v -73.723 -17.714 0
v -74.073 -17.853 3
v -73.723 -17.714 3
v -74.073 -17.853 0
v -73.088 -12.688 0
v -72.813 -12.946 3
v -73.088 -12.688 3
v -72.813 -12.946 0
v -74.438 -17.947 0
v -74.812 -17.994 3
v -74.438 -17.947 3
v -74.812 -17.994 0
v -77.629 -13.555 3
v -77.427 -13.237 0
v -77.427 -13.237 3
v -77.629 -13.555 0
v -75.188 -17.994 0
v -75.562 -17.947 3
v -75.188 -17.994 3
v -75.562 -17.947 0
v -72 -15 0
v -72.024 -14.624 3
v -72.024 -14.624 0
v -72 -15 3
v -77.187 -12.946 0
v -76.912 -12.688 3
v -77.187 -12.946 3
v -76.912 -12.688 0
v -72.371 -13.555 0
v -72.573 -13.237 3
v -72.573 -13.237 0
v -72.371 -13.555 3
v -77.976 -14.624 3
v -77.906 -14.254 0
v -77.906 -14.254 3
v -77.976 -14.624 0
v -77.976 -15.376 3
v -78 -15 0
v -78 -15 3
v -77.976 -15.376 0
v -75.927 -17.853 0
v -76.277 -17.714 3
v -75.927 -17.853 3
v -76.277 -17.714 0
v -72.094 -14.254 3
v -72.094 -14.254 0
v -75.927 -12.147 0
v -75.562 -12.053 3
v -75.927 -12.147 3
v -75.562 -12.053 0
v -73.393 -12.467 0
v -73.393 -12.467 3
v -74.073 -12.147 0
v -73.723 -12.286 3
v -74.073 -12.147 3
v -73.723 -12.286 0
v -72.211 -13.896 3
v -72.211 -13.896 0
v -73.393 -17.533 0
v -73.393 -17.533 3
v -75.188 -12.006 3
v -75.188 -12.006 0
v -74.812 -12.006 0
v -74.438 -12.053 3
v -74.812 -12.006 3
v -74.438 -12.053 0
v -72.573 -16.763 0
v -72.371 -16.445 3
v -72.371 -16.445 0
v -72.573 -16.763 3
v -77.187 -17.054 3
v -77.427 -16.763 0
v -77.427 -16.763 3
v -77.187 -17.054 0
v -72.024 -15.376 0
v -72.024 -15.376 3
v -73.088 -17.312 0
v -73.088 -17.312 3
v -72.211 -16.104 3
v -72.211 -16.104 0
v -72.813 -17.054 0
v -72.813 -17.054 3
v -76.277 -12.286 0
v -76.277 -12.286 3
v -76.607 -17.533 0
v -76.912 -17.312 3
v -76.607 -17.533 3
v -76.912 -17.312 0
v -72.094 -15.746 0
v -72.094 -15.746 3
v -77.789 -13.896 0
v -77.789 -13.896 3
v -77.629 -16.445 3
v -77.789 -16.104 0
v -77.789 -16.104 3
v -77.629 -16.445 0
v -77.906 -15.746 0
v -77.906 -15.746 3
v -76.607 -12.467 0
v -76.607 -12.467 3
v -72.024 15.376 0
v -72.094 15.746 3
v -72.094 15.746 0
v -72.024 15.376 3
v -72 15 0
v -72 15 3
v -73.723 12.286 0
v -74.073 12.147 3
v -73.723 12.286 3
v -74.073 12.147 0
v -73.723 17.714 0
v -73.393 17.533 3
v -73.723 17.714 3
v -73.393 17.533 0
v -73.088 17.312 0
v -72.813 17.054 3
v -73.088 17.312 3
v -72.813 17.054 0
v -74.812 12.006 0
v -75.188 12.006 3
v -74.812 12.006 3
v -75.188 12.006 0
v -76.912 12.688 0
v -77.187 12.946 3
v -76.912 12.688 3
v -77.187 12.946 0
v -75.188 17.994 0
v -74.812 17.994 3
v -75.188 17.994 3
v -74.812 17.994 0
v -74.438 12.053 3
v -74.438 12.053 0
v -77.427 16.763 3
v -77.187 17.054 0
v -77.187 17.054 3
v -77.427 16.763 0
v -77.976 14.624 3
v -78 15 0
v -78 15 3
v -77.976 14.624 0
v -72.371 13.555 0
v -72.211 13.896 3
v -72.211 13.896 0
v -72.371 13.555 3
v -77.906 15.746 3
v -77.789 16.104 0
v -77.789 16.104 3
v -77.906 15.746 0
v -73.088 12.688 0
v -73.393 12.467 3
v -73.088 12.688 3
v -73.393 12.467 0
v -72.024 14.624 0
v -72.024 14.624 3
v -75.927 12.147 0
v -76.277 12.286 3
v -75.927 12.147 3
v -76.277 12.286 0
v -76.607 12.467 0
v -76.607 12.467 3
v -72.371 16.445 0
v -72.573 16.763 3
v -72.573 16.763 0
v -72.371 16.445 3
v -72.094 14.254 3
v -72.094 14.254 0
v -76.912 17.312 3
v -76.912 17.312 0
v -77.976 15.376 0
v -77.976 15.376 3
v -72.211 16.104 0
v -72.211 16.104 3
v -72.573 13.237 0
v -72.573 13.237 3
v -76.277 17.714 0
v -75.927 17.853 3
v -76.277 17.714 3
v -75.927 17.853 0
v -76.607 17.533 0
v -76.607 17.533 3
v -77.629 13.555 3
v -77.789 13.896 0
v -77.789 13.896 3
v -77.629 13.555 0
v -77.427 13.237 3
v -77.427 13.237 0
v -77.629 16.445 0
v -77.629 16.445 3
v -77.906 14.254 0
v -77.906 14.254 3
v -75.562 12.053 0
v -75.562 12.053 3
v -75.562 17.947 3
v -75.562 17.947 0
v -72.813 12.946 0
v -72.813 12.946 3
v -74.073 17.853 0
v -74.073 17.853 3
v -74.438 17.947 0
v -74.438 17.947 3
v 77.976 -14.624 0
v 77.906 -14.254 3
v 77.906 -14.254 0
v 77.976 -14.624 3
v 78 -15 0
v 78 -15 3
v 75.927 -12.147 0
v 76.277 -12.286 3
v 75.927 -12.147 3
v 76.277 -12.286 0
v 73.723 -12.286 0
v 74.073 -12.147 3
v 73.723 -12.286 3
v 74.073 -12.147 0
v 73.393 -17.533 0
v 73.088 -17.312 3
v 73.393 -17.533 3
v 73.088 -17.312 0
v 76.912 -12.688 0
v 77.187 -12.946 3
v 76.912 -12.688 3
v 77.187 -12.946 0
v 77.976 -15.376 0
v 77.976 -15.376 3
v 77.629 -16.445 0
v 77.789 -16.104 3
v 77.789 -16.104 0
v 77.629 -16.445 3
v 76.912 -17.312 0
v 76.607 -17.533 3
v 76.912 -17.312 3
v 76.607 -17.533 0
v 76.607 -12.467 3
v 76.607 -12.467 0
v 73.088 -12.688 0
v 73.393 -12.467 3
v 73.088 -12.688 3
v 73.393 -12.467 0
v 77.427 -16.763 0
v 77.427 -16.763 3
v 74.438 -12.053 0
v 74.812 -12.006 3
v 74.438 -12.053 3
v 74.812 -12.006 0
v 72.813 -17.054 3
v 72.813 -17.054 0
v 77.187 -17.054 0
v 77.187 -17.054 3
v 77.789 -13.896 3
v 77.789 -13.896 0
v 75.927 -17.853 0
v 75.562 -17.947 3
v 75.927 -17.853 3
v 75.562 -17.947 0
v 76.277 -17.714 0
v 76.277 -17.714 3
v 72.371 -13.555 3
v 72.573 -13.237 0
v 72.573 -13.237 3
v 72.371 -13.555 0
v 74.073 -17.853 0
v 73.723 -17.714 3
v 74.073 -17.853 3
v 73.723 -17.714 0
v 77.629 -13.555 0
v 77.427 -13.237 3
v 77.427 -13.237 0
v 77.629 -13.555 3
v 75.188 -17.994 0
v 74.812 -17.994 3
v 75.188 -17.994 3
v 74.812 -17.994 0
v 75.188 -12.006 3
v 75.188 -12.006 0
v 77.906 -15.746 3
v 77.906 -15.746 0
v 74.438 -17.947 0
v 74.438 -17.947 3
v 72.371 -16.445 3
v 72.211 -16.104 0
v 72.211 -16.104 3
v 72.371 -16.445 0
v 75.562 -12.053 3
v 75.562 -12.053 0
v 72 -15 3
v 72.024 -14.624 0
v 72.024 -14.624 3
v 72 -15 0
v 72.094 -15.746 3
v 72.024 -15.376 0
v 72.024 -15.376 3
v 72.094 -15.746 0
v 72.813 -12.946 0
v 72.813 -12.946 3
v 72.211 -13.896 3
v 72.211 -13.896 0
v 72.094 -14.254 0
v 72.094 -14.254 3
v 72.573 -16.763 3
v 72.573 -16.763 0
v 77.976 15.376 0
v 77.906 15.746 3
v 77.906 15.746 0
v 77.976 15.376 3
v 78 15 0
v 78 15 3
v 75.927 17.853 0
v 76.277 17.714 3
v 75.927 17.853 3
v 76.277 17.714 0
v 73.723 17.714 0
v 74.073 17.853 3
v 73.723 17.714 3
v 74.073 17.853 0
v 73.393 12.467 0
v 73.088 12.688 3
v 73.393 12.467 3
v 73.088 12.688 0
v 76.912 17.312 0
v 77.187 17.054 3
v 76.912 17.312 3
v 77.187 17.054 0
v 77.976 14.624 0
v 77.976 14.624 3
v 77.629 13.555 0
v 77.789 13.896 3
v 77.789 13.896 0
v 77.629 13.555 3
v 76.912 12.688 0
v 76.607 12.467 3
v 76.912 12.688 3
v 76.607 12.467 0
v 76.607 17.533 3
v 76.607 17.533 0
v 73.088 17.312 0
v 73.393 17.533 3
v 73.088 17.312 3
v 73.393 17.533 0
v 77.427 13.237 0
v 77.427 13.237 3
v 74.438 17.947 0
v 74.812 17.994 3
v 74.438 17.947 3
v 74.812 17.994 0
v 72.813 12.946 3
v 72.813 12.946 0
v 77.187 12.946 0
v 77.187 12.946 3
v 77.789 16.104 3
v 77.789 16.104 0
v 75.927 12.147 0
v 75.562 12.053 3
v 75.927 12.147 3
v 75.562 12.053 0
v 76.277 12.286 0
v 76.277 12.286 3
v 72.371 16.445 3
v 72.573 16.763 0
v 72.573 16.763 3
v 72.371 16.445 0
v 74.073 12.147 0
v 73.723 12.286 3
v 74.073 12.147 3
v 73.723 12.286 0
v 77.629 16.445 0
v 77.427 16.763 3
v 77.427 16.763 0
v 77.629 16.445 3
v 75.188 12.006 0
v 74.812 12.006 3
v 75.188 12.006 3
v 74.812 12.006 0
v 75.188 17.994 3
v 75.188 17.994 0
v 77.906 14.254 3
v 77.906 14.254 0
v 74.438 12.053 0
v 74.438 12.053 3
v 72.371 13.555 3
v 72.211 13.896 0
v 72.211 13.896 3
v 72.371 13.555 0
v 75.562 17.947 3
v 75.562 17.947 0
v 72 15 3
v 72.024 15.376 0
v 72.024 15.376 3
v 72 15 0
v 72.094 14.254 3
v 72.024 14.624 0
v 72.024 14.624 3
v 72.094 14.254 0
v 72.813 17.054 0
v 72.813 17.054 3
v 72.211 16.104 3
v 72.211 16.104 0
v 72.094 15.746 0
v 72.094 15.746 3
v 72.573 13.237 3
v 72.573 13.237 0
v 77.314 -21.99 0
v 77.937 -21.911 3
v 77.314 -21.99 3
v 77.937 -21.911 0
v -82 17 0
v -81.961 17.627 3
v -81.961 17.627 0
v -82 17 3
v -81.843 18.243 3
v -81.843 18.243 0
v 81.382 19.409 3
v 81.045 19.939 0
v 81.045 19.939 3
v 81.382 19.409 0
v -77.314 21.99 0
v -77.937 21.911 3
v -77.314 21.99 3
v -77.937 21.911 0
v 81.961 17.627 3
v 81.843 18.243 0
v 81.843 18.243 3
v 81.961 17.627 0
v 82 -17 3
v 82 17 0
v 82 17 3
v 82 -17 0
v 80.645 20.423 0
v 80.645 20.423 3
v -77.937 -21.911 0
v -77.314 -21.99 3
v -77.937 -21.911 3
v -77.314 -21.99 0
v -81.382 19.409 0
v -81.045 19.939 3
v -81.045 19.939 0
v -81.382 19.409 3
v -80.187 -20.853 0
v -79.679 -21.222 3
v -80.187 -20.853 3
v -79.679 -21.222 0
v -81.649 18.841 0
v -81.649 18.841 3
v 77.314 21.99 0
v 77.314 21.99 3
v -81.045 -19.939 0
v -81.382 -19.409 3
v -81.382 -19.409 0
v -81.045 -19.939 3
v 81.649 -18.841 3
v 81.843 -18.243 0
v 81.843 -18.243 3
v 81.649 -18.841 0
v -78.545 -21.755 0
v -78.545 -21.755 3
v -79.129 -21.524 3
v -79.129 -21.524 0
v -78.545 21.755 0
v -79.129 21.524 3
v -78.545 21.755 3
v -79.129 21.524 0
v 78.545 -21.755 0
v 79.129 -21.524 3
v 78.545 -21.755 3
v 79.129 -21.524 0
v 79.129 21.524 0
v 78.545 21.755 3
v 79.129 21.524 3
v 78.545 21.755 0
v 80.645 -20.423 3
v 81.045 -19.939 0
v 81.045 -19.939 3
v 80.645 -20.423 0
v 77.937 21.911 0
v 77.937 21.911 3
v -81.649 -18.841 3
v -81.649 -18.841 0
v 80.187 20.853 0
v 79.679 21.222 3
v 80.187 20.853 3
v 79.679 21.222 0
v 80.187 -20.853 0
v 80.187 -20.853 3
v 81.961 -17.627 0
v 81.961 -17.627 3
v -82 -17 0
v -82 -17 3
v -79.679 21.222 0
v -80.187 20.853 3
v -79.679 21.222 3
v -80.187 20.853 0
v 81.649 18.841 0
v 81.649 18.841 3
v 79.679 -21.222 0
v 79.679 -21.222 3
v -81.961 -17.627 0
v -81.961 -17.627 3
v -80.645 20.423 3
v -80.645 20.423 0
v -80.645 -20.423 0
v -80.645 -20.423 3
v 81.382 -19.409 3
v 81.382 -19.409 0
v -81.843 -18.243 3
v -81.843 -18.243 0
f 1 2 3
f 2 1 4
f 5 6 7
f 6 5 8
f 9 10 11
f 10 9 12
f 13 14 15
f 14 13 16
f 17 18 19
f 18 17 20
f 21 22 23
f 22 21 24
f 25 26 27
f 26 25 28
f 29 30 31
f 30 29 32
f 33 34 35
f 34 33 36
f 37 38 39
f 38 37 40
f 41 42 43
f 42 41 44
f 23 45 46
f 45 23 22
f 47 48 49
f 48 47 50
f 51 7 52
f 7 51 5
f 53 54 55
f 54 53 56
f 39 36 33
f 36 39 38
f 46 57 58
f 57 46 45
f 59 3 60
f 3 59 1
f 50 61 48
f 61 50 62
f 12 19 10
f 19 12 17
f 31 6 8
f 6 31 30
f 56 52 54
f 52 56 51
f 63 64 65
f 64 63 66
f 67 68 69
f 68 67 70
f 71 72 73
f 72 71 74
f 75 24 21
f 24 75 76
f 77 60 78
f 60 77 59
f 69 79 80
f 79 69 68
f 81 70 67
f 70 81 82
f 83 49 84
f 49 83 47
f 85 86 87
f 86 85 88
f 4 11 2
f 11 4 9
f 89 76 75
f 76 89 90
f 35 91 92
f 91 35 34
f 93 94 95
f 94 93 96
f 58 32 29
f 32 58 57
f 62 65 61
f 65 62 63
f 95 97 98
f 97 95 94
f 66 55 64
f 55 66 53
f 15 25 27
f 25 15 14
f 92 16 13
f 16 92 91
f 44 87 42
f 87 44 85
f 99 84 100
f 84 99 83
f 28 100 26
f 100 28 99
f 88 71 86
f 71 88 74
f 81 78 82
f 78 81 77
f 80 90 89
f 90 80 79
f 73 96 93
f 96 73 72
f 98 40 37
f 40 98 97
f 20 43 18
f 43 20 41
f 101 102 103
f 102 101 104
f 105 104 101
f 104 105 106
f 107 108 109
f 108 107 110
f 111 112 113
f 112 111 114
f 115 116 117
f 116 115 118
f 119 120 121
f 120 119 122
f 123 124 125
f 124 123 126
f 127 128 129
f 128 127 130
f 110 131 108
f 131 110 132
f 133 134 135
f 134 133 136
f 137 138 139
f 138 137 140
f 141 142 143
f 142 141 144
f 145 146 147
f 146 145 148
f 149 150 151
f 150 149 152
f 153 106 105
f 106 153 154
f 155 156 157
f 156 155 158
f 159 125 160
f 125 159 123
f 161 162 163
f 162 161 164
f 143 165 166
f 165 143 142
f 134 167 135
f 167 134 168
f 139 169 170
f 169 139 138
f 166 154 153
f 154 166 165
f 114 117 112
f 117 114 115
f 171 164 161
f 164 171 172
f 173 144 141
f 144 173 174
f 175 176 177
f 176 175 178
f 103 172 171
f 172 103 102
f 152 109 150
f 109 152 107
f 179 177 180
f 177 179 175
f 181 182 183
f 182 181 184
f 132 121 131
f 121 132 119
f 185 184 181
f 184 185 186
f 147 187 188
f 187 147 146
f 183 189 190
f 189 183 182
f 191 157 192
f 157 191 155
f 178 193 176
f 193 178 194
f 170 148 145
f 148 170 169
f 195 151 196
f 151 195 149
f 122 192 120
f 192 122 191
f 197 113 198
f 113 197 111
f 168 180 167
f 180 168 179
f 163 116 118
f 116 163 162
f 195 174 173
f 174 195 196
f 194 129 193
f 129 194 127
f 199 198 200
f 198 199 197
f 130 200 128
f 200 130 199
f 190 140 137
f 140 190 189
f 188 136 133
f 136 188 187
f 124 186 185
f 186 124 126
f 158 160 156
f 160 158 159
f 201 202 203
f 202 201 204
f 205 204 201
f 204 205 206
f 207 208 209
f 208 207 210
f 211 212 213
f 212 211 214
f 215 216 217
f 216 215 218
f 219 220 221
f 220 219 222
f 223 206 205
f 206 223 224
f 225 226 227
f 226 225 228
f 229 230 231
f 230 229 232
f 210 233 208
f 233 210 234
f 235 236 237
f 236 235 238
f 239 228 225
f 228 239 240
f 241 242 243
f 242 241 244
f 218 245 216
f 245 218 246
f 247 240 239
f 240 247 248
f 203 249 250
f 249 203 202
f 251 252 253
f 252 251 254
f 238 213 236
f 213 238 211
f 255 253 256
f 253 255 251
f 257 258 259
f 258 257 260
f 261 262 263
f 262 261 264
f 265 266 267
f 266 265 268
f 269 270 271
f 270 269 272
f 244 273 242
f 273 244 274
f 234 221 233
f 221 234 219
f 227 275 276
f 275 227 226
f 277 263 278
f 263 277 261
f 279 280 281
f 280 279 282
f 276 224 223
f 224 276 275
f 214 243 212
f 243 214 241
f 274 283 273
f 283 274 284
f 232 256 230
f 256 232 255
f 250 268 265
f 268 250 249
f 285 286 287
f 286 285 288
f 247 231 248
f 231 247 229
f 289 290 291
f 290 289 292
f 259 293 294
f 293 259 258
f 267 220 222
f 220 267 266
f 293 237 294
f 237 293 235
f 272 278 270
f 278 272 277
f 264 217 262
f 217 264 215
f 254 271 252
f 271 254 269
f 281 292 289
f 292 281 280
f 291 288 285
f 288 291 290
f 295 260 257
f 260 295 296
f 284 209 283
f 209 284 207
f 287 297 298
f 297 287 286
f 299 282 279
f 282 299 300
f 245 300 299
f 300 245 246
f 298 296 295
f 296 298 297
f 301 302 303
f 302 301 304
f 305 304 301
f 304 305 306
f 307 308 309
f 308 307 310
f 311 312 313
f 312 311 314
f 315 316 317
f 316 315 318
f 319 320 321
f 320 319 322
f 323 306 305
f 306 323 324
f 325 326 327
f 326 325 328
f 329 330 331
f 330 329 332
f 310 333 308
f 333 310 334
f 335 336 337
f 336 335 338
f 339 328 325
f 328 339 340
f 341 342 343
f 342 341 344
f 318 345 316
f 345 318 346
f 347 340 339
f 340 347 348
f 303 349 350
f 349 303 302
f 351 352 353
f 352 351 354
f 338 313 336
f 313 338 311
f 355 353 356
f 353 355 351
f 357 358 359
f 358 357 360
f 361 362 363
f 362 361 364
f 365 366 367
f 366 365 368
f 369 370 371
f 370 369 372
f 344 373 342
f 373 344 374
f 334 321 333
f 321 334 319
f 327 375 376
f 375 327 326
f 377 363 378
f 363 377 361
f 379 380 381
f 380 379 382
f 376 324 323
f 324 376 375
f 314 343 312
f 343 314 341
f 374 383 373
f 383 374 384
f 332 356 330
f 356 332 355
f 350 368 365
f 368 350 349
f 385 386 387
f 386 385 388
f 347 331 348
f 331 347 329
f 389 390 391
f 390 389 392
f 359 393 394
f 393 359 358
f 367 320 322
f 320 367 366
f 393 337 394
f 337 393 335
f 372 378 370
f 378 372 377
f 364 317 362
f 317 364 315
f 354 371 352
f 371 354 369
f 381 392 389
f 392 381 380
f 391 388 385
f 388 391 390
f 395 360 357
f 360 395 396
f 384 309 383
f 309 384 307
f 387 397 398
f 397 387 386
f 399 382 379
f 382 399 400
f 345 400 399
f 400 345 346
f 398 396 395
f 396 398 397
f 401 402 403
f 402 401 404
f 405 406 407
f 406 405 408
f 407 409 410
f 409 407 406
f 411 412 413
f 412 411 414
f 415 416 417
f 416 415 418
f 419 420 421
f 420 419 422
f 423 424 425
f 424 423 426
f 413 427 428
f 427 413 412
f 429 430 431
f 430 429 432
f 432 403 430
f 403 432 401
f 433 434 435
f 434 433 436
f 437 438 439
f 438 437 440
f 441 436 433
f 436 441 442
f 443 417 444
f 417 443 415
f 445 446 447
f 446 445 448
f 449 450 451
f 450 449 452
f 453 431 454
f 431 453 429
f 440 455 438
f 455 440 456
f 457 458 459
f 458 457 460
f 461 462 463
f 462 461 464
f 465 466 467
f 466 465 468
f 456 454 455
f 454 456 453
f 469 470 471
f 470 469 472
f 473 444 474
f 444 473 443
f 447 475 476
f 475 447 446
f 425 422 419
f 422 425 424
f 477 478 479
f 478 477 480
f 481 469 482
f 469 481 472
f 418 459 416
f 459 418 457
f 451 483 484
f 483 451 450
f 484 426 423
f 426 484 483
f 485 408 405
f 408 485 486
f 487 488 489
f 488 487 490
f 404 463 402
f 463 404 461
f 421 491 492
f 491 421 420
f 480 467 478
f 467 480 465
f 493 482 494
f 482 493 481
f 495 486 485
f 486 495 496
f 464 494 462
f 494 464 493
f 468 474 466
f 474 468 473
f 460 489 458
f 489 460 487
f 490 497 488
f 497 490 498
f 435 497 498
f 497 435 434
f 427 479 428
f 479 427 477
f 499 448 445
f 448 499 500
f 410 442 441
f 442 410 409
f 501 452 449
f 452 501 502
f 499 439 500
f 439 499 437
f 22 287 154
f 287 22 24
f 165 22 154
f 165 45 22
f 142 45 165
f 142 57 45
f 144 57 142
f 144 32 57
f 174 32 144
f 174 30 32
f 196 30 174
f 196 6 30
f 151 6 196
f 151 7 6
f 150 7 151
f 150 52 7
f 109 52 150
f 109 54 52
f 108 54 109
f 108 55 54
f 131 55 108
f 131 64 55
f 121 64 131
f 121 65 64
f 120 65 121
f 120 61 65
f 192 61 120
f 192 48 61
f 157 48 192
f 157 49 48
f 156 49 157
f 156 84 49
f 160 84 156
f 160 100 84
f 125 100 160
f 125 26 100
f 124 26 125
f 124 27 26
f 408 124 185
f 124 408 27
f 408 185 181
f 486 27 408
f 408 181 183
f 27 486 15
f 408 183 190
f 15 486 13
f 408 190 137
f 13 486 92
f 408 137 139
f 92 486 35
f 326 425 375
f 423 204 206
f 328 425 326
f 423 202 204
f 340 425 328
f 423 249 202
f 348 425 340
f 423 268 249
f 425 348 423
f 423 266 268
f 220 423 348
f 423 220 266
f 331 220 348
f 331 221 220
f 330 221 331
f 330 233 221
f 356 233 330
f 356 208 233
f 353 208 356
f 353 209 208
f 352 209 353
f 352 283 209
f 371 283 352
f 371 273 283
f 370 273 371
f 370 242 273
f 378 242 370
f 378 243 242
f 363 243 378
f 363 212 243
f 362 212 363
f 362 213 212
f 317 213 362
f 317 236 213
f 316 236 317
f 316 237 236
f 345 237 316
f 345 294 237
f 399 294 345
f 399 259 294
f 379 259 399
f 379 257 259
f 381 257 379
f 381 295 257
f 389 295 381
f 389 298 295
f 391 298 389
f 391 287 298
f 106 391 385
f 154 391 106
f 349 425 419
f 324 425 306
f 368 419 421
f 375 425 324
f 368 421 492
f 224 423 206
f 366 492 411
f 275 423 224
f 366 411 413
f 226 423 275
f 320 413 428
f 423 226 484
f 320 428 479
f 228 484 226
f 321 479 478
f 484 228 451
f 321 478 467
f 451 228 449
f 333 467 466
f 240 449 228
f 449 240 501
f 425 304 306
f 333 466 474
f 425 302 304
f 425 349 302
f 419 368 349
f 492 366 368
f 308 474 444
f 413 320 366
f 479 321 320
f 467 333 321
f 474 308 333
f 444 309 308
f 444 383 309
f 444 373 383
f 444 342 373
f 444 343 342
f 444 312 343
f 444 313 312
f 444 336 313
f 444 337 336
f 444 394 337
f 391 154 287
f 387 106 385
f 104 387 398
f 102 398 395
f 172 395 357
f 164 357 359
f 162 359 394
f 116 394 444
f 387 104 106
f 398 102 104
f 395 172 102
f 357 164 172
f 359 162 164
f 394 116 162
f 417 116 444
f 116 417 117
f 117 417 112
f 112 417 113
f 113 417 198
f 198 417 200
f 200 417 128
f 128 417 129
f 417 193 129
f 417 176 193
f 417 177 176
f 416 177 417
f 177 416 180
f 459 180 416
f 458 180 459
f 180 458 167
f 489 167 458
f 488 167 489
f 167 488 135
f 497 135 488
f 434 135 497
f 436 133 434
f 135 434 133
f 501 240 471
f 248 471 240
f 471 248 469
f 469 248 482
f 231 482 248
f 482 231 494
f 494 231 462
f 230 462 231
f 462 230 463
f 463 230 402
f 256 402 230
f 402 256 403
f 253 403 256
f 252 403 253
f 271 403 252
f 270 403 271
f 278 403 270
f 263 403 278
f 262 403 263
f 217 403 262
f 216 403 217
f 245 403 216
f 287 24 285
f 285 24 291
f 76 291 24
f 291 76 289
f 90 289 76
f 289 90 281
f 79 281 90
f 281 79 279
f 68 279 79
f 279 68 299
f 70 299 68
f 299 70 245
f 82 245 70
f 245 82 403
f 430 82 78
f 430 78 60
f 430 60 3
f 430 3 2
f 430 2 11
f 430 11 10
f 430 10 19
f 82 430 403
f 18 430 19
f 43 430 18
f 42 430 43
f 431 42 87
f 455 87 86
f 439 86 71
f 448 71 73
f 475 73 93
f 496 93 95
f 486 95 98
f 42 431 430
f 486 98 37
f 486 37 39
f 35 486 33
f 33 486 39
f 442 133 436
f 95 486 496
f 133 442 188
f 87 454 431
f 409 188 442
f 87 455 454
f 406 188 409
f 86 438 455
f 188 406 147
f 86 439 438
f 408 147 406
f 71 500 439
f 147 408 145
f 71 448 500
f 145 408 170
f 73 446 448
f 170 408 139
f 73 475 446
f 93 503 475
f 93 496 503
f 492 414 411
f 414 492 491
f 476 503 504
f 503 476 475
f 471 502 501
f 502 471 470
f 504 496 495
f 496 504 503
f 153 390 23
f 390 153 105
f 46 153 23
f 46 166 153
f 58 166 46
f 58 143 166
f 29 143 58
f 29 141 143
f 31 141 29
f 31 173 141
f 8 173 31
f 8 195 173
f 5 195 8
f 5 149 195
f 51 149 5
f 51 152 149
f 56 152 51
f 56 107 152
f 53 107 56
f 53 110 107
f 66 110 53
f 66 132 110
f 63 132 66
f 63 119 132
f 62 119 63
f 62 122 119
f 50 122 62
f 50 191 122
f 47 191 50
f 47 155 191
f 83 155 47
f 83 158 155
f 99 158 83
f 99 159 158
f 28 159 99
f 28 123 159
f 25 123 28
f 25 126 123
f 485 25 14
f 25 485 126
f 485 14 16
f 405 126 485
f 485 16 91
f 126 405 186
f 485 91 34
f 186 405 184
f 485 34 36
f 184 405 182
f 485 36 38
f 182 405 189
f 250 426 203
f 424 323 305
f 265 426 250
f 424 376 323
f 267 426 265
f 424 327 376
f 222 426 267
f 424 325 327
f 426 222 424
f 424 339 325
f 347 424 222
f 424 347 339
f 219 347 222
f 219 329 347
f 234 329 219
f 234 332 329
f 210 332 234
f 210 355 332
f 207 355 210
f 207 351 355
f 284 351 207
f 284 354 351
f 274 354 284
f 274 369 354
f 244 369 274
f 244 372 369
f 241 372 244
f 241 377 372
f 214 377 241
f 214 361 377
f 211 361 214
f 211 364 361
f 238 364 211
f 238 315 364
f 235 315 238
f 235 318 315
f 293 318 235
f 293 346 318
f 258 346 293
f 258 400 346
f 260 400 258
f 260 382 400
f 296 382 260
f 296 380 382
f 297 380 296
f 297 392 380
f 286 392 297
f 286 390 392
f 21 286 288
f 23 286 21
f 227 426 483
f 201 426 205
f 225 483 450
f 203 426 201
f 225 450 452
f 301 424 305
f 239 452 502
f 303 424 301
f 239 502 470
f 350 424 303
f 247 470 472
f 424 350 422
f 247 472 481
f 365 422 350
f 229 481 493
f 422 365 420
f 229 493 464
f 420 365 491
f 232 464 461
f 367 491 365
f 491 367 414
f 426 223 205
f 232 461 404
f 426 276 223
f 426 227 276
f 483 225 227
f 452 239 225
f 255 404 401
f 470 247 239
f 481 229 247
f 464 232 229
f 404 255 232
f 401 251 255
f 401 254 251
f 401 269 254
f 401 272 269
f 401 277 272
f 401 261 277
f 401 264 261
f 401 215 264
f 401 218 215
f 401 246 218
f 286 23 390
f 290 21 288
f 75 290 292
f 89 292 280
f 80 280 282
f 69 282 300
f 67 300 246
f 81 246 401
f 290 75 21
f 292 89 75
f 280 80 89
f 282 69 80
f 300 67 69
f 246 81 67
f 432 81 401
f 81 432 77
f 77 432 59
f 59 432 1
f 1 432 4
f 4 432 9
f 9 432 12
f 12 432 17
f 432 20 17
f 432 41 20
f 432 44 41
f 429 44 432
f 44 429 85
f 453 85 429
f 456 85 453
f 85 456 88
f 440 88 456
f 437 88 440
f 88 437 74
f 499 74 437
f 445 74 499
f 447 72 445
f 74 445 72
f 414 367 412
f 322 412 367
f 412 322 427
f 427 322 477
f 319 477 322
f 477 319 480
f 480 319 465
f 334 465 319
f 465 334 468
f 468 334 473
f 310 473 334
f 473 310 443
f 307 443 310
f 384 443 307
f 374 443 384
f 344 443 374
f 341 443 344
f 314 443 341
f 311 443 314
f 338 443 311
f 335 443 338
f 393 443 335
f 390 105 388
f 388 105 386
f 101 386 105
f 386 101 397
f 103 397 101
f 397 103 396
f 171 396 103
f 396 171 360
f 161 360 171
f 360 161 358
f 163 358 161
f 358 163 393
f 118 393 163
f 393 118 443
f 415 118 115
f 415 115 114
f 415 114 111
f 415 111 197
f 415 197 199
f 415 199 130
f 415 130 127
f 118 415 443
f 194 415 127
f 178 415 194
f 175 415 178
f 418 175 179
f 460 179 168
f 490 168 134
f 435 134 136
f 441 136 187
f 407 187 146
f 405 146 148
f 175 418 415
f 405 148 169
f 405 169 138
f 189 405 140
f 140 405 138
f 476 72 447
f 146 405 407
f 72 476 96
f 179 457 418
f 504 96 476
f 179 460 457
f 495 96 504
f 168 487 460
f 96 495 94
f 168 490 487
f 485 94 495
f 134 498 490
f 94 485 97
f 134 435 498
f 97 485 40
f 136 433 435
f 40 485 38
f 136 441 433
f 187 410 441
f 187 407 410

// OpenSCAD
$fn = 50;


difference() {
	union() {
		hull() {
			translate(v = [-77.0000000000, 17.0000000000, 0]) {
				cylinder(h = 3, r = 5);
			}
			translate(v = [77.0000000000, 17.0000000000, 0]) {
				cylinder(h = 3, r = 5);
			}
			translate(v = [-77.0000000000, -17.0000000000, 0]) {
				cylinder(h = 3, r = 5);
			}
			translate(v = [77.0000000000, -17.0000000000, 0]) {
				cylinder(h = 3, r = 5);
			}
		}
	}
	union() {
		translate(v = [-75.0000000000, -15.0000000000, -100.0000000000]) {
			cylinder(h = 200, r = 3.0000000000);
		}
		translate(v = [-75.0000000000, 15.0000000000, -100.0000000000]) {
			cylinder(h = 200, r = 3.0000000000);
		}
		translate(v = [75.0000000000, -15.0000000000, -100.0000000000]) {
			cylinder(h = 200, r = 3.0000000000);
		}
		translate(v = [75.0000000000, 15.0000000000, -100.0000000000]) {
			cylinder(h = 200, r = 3.0000000000);
		}
	}
}
